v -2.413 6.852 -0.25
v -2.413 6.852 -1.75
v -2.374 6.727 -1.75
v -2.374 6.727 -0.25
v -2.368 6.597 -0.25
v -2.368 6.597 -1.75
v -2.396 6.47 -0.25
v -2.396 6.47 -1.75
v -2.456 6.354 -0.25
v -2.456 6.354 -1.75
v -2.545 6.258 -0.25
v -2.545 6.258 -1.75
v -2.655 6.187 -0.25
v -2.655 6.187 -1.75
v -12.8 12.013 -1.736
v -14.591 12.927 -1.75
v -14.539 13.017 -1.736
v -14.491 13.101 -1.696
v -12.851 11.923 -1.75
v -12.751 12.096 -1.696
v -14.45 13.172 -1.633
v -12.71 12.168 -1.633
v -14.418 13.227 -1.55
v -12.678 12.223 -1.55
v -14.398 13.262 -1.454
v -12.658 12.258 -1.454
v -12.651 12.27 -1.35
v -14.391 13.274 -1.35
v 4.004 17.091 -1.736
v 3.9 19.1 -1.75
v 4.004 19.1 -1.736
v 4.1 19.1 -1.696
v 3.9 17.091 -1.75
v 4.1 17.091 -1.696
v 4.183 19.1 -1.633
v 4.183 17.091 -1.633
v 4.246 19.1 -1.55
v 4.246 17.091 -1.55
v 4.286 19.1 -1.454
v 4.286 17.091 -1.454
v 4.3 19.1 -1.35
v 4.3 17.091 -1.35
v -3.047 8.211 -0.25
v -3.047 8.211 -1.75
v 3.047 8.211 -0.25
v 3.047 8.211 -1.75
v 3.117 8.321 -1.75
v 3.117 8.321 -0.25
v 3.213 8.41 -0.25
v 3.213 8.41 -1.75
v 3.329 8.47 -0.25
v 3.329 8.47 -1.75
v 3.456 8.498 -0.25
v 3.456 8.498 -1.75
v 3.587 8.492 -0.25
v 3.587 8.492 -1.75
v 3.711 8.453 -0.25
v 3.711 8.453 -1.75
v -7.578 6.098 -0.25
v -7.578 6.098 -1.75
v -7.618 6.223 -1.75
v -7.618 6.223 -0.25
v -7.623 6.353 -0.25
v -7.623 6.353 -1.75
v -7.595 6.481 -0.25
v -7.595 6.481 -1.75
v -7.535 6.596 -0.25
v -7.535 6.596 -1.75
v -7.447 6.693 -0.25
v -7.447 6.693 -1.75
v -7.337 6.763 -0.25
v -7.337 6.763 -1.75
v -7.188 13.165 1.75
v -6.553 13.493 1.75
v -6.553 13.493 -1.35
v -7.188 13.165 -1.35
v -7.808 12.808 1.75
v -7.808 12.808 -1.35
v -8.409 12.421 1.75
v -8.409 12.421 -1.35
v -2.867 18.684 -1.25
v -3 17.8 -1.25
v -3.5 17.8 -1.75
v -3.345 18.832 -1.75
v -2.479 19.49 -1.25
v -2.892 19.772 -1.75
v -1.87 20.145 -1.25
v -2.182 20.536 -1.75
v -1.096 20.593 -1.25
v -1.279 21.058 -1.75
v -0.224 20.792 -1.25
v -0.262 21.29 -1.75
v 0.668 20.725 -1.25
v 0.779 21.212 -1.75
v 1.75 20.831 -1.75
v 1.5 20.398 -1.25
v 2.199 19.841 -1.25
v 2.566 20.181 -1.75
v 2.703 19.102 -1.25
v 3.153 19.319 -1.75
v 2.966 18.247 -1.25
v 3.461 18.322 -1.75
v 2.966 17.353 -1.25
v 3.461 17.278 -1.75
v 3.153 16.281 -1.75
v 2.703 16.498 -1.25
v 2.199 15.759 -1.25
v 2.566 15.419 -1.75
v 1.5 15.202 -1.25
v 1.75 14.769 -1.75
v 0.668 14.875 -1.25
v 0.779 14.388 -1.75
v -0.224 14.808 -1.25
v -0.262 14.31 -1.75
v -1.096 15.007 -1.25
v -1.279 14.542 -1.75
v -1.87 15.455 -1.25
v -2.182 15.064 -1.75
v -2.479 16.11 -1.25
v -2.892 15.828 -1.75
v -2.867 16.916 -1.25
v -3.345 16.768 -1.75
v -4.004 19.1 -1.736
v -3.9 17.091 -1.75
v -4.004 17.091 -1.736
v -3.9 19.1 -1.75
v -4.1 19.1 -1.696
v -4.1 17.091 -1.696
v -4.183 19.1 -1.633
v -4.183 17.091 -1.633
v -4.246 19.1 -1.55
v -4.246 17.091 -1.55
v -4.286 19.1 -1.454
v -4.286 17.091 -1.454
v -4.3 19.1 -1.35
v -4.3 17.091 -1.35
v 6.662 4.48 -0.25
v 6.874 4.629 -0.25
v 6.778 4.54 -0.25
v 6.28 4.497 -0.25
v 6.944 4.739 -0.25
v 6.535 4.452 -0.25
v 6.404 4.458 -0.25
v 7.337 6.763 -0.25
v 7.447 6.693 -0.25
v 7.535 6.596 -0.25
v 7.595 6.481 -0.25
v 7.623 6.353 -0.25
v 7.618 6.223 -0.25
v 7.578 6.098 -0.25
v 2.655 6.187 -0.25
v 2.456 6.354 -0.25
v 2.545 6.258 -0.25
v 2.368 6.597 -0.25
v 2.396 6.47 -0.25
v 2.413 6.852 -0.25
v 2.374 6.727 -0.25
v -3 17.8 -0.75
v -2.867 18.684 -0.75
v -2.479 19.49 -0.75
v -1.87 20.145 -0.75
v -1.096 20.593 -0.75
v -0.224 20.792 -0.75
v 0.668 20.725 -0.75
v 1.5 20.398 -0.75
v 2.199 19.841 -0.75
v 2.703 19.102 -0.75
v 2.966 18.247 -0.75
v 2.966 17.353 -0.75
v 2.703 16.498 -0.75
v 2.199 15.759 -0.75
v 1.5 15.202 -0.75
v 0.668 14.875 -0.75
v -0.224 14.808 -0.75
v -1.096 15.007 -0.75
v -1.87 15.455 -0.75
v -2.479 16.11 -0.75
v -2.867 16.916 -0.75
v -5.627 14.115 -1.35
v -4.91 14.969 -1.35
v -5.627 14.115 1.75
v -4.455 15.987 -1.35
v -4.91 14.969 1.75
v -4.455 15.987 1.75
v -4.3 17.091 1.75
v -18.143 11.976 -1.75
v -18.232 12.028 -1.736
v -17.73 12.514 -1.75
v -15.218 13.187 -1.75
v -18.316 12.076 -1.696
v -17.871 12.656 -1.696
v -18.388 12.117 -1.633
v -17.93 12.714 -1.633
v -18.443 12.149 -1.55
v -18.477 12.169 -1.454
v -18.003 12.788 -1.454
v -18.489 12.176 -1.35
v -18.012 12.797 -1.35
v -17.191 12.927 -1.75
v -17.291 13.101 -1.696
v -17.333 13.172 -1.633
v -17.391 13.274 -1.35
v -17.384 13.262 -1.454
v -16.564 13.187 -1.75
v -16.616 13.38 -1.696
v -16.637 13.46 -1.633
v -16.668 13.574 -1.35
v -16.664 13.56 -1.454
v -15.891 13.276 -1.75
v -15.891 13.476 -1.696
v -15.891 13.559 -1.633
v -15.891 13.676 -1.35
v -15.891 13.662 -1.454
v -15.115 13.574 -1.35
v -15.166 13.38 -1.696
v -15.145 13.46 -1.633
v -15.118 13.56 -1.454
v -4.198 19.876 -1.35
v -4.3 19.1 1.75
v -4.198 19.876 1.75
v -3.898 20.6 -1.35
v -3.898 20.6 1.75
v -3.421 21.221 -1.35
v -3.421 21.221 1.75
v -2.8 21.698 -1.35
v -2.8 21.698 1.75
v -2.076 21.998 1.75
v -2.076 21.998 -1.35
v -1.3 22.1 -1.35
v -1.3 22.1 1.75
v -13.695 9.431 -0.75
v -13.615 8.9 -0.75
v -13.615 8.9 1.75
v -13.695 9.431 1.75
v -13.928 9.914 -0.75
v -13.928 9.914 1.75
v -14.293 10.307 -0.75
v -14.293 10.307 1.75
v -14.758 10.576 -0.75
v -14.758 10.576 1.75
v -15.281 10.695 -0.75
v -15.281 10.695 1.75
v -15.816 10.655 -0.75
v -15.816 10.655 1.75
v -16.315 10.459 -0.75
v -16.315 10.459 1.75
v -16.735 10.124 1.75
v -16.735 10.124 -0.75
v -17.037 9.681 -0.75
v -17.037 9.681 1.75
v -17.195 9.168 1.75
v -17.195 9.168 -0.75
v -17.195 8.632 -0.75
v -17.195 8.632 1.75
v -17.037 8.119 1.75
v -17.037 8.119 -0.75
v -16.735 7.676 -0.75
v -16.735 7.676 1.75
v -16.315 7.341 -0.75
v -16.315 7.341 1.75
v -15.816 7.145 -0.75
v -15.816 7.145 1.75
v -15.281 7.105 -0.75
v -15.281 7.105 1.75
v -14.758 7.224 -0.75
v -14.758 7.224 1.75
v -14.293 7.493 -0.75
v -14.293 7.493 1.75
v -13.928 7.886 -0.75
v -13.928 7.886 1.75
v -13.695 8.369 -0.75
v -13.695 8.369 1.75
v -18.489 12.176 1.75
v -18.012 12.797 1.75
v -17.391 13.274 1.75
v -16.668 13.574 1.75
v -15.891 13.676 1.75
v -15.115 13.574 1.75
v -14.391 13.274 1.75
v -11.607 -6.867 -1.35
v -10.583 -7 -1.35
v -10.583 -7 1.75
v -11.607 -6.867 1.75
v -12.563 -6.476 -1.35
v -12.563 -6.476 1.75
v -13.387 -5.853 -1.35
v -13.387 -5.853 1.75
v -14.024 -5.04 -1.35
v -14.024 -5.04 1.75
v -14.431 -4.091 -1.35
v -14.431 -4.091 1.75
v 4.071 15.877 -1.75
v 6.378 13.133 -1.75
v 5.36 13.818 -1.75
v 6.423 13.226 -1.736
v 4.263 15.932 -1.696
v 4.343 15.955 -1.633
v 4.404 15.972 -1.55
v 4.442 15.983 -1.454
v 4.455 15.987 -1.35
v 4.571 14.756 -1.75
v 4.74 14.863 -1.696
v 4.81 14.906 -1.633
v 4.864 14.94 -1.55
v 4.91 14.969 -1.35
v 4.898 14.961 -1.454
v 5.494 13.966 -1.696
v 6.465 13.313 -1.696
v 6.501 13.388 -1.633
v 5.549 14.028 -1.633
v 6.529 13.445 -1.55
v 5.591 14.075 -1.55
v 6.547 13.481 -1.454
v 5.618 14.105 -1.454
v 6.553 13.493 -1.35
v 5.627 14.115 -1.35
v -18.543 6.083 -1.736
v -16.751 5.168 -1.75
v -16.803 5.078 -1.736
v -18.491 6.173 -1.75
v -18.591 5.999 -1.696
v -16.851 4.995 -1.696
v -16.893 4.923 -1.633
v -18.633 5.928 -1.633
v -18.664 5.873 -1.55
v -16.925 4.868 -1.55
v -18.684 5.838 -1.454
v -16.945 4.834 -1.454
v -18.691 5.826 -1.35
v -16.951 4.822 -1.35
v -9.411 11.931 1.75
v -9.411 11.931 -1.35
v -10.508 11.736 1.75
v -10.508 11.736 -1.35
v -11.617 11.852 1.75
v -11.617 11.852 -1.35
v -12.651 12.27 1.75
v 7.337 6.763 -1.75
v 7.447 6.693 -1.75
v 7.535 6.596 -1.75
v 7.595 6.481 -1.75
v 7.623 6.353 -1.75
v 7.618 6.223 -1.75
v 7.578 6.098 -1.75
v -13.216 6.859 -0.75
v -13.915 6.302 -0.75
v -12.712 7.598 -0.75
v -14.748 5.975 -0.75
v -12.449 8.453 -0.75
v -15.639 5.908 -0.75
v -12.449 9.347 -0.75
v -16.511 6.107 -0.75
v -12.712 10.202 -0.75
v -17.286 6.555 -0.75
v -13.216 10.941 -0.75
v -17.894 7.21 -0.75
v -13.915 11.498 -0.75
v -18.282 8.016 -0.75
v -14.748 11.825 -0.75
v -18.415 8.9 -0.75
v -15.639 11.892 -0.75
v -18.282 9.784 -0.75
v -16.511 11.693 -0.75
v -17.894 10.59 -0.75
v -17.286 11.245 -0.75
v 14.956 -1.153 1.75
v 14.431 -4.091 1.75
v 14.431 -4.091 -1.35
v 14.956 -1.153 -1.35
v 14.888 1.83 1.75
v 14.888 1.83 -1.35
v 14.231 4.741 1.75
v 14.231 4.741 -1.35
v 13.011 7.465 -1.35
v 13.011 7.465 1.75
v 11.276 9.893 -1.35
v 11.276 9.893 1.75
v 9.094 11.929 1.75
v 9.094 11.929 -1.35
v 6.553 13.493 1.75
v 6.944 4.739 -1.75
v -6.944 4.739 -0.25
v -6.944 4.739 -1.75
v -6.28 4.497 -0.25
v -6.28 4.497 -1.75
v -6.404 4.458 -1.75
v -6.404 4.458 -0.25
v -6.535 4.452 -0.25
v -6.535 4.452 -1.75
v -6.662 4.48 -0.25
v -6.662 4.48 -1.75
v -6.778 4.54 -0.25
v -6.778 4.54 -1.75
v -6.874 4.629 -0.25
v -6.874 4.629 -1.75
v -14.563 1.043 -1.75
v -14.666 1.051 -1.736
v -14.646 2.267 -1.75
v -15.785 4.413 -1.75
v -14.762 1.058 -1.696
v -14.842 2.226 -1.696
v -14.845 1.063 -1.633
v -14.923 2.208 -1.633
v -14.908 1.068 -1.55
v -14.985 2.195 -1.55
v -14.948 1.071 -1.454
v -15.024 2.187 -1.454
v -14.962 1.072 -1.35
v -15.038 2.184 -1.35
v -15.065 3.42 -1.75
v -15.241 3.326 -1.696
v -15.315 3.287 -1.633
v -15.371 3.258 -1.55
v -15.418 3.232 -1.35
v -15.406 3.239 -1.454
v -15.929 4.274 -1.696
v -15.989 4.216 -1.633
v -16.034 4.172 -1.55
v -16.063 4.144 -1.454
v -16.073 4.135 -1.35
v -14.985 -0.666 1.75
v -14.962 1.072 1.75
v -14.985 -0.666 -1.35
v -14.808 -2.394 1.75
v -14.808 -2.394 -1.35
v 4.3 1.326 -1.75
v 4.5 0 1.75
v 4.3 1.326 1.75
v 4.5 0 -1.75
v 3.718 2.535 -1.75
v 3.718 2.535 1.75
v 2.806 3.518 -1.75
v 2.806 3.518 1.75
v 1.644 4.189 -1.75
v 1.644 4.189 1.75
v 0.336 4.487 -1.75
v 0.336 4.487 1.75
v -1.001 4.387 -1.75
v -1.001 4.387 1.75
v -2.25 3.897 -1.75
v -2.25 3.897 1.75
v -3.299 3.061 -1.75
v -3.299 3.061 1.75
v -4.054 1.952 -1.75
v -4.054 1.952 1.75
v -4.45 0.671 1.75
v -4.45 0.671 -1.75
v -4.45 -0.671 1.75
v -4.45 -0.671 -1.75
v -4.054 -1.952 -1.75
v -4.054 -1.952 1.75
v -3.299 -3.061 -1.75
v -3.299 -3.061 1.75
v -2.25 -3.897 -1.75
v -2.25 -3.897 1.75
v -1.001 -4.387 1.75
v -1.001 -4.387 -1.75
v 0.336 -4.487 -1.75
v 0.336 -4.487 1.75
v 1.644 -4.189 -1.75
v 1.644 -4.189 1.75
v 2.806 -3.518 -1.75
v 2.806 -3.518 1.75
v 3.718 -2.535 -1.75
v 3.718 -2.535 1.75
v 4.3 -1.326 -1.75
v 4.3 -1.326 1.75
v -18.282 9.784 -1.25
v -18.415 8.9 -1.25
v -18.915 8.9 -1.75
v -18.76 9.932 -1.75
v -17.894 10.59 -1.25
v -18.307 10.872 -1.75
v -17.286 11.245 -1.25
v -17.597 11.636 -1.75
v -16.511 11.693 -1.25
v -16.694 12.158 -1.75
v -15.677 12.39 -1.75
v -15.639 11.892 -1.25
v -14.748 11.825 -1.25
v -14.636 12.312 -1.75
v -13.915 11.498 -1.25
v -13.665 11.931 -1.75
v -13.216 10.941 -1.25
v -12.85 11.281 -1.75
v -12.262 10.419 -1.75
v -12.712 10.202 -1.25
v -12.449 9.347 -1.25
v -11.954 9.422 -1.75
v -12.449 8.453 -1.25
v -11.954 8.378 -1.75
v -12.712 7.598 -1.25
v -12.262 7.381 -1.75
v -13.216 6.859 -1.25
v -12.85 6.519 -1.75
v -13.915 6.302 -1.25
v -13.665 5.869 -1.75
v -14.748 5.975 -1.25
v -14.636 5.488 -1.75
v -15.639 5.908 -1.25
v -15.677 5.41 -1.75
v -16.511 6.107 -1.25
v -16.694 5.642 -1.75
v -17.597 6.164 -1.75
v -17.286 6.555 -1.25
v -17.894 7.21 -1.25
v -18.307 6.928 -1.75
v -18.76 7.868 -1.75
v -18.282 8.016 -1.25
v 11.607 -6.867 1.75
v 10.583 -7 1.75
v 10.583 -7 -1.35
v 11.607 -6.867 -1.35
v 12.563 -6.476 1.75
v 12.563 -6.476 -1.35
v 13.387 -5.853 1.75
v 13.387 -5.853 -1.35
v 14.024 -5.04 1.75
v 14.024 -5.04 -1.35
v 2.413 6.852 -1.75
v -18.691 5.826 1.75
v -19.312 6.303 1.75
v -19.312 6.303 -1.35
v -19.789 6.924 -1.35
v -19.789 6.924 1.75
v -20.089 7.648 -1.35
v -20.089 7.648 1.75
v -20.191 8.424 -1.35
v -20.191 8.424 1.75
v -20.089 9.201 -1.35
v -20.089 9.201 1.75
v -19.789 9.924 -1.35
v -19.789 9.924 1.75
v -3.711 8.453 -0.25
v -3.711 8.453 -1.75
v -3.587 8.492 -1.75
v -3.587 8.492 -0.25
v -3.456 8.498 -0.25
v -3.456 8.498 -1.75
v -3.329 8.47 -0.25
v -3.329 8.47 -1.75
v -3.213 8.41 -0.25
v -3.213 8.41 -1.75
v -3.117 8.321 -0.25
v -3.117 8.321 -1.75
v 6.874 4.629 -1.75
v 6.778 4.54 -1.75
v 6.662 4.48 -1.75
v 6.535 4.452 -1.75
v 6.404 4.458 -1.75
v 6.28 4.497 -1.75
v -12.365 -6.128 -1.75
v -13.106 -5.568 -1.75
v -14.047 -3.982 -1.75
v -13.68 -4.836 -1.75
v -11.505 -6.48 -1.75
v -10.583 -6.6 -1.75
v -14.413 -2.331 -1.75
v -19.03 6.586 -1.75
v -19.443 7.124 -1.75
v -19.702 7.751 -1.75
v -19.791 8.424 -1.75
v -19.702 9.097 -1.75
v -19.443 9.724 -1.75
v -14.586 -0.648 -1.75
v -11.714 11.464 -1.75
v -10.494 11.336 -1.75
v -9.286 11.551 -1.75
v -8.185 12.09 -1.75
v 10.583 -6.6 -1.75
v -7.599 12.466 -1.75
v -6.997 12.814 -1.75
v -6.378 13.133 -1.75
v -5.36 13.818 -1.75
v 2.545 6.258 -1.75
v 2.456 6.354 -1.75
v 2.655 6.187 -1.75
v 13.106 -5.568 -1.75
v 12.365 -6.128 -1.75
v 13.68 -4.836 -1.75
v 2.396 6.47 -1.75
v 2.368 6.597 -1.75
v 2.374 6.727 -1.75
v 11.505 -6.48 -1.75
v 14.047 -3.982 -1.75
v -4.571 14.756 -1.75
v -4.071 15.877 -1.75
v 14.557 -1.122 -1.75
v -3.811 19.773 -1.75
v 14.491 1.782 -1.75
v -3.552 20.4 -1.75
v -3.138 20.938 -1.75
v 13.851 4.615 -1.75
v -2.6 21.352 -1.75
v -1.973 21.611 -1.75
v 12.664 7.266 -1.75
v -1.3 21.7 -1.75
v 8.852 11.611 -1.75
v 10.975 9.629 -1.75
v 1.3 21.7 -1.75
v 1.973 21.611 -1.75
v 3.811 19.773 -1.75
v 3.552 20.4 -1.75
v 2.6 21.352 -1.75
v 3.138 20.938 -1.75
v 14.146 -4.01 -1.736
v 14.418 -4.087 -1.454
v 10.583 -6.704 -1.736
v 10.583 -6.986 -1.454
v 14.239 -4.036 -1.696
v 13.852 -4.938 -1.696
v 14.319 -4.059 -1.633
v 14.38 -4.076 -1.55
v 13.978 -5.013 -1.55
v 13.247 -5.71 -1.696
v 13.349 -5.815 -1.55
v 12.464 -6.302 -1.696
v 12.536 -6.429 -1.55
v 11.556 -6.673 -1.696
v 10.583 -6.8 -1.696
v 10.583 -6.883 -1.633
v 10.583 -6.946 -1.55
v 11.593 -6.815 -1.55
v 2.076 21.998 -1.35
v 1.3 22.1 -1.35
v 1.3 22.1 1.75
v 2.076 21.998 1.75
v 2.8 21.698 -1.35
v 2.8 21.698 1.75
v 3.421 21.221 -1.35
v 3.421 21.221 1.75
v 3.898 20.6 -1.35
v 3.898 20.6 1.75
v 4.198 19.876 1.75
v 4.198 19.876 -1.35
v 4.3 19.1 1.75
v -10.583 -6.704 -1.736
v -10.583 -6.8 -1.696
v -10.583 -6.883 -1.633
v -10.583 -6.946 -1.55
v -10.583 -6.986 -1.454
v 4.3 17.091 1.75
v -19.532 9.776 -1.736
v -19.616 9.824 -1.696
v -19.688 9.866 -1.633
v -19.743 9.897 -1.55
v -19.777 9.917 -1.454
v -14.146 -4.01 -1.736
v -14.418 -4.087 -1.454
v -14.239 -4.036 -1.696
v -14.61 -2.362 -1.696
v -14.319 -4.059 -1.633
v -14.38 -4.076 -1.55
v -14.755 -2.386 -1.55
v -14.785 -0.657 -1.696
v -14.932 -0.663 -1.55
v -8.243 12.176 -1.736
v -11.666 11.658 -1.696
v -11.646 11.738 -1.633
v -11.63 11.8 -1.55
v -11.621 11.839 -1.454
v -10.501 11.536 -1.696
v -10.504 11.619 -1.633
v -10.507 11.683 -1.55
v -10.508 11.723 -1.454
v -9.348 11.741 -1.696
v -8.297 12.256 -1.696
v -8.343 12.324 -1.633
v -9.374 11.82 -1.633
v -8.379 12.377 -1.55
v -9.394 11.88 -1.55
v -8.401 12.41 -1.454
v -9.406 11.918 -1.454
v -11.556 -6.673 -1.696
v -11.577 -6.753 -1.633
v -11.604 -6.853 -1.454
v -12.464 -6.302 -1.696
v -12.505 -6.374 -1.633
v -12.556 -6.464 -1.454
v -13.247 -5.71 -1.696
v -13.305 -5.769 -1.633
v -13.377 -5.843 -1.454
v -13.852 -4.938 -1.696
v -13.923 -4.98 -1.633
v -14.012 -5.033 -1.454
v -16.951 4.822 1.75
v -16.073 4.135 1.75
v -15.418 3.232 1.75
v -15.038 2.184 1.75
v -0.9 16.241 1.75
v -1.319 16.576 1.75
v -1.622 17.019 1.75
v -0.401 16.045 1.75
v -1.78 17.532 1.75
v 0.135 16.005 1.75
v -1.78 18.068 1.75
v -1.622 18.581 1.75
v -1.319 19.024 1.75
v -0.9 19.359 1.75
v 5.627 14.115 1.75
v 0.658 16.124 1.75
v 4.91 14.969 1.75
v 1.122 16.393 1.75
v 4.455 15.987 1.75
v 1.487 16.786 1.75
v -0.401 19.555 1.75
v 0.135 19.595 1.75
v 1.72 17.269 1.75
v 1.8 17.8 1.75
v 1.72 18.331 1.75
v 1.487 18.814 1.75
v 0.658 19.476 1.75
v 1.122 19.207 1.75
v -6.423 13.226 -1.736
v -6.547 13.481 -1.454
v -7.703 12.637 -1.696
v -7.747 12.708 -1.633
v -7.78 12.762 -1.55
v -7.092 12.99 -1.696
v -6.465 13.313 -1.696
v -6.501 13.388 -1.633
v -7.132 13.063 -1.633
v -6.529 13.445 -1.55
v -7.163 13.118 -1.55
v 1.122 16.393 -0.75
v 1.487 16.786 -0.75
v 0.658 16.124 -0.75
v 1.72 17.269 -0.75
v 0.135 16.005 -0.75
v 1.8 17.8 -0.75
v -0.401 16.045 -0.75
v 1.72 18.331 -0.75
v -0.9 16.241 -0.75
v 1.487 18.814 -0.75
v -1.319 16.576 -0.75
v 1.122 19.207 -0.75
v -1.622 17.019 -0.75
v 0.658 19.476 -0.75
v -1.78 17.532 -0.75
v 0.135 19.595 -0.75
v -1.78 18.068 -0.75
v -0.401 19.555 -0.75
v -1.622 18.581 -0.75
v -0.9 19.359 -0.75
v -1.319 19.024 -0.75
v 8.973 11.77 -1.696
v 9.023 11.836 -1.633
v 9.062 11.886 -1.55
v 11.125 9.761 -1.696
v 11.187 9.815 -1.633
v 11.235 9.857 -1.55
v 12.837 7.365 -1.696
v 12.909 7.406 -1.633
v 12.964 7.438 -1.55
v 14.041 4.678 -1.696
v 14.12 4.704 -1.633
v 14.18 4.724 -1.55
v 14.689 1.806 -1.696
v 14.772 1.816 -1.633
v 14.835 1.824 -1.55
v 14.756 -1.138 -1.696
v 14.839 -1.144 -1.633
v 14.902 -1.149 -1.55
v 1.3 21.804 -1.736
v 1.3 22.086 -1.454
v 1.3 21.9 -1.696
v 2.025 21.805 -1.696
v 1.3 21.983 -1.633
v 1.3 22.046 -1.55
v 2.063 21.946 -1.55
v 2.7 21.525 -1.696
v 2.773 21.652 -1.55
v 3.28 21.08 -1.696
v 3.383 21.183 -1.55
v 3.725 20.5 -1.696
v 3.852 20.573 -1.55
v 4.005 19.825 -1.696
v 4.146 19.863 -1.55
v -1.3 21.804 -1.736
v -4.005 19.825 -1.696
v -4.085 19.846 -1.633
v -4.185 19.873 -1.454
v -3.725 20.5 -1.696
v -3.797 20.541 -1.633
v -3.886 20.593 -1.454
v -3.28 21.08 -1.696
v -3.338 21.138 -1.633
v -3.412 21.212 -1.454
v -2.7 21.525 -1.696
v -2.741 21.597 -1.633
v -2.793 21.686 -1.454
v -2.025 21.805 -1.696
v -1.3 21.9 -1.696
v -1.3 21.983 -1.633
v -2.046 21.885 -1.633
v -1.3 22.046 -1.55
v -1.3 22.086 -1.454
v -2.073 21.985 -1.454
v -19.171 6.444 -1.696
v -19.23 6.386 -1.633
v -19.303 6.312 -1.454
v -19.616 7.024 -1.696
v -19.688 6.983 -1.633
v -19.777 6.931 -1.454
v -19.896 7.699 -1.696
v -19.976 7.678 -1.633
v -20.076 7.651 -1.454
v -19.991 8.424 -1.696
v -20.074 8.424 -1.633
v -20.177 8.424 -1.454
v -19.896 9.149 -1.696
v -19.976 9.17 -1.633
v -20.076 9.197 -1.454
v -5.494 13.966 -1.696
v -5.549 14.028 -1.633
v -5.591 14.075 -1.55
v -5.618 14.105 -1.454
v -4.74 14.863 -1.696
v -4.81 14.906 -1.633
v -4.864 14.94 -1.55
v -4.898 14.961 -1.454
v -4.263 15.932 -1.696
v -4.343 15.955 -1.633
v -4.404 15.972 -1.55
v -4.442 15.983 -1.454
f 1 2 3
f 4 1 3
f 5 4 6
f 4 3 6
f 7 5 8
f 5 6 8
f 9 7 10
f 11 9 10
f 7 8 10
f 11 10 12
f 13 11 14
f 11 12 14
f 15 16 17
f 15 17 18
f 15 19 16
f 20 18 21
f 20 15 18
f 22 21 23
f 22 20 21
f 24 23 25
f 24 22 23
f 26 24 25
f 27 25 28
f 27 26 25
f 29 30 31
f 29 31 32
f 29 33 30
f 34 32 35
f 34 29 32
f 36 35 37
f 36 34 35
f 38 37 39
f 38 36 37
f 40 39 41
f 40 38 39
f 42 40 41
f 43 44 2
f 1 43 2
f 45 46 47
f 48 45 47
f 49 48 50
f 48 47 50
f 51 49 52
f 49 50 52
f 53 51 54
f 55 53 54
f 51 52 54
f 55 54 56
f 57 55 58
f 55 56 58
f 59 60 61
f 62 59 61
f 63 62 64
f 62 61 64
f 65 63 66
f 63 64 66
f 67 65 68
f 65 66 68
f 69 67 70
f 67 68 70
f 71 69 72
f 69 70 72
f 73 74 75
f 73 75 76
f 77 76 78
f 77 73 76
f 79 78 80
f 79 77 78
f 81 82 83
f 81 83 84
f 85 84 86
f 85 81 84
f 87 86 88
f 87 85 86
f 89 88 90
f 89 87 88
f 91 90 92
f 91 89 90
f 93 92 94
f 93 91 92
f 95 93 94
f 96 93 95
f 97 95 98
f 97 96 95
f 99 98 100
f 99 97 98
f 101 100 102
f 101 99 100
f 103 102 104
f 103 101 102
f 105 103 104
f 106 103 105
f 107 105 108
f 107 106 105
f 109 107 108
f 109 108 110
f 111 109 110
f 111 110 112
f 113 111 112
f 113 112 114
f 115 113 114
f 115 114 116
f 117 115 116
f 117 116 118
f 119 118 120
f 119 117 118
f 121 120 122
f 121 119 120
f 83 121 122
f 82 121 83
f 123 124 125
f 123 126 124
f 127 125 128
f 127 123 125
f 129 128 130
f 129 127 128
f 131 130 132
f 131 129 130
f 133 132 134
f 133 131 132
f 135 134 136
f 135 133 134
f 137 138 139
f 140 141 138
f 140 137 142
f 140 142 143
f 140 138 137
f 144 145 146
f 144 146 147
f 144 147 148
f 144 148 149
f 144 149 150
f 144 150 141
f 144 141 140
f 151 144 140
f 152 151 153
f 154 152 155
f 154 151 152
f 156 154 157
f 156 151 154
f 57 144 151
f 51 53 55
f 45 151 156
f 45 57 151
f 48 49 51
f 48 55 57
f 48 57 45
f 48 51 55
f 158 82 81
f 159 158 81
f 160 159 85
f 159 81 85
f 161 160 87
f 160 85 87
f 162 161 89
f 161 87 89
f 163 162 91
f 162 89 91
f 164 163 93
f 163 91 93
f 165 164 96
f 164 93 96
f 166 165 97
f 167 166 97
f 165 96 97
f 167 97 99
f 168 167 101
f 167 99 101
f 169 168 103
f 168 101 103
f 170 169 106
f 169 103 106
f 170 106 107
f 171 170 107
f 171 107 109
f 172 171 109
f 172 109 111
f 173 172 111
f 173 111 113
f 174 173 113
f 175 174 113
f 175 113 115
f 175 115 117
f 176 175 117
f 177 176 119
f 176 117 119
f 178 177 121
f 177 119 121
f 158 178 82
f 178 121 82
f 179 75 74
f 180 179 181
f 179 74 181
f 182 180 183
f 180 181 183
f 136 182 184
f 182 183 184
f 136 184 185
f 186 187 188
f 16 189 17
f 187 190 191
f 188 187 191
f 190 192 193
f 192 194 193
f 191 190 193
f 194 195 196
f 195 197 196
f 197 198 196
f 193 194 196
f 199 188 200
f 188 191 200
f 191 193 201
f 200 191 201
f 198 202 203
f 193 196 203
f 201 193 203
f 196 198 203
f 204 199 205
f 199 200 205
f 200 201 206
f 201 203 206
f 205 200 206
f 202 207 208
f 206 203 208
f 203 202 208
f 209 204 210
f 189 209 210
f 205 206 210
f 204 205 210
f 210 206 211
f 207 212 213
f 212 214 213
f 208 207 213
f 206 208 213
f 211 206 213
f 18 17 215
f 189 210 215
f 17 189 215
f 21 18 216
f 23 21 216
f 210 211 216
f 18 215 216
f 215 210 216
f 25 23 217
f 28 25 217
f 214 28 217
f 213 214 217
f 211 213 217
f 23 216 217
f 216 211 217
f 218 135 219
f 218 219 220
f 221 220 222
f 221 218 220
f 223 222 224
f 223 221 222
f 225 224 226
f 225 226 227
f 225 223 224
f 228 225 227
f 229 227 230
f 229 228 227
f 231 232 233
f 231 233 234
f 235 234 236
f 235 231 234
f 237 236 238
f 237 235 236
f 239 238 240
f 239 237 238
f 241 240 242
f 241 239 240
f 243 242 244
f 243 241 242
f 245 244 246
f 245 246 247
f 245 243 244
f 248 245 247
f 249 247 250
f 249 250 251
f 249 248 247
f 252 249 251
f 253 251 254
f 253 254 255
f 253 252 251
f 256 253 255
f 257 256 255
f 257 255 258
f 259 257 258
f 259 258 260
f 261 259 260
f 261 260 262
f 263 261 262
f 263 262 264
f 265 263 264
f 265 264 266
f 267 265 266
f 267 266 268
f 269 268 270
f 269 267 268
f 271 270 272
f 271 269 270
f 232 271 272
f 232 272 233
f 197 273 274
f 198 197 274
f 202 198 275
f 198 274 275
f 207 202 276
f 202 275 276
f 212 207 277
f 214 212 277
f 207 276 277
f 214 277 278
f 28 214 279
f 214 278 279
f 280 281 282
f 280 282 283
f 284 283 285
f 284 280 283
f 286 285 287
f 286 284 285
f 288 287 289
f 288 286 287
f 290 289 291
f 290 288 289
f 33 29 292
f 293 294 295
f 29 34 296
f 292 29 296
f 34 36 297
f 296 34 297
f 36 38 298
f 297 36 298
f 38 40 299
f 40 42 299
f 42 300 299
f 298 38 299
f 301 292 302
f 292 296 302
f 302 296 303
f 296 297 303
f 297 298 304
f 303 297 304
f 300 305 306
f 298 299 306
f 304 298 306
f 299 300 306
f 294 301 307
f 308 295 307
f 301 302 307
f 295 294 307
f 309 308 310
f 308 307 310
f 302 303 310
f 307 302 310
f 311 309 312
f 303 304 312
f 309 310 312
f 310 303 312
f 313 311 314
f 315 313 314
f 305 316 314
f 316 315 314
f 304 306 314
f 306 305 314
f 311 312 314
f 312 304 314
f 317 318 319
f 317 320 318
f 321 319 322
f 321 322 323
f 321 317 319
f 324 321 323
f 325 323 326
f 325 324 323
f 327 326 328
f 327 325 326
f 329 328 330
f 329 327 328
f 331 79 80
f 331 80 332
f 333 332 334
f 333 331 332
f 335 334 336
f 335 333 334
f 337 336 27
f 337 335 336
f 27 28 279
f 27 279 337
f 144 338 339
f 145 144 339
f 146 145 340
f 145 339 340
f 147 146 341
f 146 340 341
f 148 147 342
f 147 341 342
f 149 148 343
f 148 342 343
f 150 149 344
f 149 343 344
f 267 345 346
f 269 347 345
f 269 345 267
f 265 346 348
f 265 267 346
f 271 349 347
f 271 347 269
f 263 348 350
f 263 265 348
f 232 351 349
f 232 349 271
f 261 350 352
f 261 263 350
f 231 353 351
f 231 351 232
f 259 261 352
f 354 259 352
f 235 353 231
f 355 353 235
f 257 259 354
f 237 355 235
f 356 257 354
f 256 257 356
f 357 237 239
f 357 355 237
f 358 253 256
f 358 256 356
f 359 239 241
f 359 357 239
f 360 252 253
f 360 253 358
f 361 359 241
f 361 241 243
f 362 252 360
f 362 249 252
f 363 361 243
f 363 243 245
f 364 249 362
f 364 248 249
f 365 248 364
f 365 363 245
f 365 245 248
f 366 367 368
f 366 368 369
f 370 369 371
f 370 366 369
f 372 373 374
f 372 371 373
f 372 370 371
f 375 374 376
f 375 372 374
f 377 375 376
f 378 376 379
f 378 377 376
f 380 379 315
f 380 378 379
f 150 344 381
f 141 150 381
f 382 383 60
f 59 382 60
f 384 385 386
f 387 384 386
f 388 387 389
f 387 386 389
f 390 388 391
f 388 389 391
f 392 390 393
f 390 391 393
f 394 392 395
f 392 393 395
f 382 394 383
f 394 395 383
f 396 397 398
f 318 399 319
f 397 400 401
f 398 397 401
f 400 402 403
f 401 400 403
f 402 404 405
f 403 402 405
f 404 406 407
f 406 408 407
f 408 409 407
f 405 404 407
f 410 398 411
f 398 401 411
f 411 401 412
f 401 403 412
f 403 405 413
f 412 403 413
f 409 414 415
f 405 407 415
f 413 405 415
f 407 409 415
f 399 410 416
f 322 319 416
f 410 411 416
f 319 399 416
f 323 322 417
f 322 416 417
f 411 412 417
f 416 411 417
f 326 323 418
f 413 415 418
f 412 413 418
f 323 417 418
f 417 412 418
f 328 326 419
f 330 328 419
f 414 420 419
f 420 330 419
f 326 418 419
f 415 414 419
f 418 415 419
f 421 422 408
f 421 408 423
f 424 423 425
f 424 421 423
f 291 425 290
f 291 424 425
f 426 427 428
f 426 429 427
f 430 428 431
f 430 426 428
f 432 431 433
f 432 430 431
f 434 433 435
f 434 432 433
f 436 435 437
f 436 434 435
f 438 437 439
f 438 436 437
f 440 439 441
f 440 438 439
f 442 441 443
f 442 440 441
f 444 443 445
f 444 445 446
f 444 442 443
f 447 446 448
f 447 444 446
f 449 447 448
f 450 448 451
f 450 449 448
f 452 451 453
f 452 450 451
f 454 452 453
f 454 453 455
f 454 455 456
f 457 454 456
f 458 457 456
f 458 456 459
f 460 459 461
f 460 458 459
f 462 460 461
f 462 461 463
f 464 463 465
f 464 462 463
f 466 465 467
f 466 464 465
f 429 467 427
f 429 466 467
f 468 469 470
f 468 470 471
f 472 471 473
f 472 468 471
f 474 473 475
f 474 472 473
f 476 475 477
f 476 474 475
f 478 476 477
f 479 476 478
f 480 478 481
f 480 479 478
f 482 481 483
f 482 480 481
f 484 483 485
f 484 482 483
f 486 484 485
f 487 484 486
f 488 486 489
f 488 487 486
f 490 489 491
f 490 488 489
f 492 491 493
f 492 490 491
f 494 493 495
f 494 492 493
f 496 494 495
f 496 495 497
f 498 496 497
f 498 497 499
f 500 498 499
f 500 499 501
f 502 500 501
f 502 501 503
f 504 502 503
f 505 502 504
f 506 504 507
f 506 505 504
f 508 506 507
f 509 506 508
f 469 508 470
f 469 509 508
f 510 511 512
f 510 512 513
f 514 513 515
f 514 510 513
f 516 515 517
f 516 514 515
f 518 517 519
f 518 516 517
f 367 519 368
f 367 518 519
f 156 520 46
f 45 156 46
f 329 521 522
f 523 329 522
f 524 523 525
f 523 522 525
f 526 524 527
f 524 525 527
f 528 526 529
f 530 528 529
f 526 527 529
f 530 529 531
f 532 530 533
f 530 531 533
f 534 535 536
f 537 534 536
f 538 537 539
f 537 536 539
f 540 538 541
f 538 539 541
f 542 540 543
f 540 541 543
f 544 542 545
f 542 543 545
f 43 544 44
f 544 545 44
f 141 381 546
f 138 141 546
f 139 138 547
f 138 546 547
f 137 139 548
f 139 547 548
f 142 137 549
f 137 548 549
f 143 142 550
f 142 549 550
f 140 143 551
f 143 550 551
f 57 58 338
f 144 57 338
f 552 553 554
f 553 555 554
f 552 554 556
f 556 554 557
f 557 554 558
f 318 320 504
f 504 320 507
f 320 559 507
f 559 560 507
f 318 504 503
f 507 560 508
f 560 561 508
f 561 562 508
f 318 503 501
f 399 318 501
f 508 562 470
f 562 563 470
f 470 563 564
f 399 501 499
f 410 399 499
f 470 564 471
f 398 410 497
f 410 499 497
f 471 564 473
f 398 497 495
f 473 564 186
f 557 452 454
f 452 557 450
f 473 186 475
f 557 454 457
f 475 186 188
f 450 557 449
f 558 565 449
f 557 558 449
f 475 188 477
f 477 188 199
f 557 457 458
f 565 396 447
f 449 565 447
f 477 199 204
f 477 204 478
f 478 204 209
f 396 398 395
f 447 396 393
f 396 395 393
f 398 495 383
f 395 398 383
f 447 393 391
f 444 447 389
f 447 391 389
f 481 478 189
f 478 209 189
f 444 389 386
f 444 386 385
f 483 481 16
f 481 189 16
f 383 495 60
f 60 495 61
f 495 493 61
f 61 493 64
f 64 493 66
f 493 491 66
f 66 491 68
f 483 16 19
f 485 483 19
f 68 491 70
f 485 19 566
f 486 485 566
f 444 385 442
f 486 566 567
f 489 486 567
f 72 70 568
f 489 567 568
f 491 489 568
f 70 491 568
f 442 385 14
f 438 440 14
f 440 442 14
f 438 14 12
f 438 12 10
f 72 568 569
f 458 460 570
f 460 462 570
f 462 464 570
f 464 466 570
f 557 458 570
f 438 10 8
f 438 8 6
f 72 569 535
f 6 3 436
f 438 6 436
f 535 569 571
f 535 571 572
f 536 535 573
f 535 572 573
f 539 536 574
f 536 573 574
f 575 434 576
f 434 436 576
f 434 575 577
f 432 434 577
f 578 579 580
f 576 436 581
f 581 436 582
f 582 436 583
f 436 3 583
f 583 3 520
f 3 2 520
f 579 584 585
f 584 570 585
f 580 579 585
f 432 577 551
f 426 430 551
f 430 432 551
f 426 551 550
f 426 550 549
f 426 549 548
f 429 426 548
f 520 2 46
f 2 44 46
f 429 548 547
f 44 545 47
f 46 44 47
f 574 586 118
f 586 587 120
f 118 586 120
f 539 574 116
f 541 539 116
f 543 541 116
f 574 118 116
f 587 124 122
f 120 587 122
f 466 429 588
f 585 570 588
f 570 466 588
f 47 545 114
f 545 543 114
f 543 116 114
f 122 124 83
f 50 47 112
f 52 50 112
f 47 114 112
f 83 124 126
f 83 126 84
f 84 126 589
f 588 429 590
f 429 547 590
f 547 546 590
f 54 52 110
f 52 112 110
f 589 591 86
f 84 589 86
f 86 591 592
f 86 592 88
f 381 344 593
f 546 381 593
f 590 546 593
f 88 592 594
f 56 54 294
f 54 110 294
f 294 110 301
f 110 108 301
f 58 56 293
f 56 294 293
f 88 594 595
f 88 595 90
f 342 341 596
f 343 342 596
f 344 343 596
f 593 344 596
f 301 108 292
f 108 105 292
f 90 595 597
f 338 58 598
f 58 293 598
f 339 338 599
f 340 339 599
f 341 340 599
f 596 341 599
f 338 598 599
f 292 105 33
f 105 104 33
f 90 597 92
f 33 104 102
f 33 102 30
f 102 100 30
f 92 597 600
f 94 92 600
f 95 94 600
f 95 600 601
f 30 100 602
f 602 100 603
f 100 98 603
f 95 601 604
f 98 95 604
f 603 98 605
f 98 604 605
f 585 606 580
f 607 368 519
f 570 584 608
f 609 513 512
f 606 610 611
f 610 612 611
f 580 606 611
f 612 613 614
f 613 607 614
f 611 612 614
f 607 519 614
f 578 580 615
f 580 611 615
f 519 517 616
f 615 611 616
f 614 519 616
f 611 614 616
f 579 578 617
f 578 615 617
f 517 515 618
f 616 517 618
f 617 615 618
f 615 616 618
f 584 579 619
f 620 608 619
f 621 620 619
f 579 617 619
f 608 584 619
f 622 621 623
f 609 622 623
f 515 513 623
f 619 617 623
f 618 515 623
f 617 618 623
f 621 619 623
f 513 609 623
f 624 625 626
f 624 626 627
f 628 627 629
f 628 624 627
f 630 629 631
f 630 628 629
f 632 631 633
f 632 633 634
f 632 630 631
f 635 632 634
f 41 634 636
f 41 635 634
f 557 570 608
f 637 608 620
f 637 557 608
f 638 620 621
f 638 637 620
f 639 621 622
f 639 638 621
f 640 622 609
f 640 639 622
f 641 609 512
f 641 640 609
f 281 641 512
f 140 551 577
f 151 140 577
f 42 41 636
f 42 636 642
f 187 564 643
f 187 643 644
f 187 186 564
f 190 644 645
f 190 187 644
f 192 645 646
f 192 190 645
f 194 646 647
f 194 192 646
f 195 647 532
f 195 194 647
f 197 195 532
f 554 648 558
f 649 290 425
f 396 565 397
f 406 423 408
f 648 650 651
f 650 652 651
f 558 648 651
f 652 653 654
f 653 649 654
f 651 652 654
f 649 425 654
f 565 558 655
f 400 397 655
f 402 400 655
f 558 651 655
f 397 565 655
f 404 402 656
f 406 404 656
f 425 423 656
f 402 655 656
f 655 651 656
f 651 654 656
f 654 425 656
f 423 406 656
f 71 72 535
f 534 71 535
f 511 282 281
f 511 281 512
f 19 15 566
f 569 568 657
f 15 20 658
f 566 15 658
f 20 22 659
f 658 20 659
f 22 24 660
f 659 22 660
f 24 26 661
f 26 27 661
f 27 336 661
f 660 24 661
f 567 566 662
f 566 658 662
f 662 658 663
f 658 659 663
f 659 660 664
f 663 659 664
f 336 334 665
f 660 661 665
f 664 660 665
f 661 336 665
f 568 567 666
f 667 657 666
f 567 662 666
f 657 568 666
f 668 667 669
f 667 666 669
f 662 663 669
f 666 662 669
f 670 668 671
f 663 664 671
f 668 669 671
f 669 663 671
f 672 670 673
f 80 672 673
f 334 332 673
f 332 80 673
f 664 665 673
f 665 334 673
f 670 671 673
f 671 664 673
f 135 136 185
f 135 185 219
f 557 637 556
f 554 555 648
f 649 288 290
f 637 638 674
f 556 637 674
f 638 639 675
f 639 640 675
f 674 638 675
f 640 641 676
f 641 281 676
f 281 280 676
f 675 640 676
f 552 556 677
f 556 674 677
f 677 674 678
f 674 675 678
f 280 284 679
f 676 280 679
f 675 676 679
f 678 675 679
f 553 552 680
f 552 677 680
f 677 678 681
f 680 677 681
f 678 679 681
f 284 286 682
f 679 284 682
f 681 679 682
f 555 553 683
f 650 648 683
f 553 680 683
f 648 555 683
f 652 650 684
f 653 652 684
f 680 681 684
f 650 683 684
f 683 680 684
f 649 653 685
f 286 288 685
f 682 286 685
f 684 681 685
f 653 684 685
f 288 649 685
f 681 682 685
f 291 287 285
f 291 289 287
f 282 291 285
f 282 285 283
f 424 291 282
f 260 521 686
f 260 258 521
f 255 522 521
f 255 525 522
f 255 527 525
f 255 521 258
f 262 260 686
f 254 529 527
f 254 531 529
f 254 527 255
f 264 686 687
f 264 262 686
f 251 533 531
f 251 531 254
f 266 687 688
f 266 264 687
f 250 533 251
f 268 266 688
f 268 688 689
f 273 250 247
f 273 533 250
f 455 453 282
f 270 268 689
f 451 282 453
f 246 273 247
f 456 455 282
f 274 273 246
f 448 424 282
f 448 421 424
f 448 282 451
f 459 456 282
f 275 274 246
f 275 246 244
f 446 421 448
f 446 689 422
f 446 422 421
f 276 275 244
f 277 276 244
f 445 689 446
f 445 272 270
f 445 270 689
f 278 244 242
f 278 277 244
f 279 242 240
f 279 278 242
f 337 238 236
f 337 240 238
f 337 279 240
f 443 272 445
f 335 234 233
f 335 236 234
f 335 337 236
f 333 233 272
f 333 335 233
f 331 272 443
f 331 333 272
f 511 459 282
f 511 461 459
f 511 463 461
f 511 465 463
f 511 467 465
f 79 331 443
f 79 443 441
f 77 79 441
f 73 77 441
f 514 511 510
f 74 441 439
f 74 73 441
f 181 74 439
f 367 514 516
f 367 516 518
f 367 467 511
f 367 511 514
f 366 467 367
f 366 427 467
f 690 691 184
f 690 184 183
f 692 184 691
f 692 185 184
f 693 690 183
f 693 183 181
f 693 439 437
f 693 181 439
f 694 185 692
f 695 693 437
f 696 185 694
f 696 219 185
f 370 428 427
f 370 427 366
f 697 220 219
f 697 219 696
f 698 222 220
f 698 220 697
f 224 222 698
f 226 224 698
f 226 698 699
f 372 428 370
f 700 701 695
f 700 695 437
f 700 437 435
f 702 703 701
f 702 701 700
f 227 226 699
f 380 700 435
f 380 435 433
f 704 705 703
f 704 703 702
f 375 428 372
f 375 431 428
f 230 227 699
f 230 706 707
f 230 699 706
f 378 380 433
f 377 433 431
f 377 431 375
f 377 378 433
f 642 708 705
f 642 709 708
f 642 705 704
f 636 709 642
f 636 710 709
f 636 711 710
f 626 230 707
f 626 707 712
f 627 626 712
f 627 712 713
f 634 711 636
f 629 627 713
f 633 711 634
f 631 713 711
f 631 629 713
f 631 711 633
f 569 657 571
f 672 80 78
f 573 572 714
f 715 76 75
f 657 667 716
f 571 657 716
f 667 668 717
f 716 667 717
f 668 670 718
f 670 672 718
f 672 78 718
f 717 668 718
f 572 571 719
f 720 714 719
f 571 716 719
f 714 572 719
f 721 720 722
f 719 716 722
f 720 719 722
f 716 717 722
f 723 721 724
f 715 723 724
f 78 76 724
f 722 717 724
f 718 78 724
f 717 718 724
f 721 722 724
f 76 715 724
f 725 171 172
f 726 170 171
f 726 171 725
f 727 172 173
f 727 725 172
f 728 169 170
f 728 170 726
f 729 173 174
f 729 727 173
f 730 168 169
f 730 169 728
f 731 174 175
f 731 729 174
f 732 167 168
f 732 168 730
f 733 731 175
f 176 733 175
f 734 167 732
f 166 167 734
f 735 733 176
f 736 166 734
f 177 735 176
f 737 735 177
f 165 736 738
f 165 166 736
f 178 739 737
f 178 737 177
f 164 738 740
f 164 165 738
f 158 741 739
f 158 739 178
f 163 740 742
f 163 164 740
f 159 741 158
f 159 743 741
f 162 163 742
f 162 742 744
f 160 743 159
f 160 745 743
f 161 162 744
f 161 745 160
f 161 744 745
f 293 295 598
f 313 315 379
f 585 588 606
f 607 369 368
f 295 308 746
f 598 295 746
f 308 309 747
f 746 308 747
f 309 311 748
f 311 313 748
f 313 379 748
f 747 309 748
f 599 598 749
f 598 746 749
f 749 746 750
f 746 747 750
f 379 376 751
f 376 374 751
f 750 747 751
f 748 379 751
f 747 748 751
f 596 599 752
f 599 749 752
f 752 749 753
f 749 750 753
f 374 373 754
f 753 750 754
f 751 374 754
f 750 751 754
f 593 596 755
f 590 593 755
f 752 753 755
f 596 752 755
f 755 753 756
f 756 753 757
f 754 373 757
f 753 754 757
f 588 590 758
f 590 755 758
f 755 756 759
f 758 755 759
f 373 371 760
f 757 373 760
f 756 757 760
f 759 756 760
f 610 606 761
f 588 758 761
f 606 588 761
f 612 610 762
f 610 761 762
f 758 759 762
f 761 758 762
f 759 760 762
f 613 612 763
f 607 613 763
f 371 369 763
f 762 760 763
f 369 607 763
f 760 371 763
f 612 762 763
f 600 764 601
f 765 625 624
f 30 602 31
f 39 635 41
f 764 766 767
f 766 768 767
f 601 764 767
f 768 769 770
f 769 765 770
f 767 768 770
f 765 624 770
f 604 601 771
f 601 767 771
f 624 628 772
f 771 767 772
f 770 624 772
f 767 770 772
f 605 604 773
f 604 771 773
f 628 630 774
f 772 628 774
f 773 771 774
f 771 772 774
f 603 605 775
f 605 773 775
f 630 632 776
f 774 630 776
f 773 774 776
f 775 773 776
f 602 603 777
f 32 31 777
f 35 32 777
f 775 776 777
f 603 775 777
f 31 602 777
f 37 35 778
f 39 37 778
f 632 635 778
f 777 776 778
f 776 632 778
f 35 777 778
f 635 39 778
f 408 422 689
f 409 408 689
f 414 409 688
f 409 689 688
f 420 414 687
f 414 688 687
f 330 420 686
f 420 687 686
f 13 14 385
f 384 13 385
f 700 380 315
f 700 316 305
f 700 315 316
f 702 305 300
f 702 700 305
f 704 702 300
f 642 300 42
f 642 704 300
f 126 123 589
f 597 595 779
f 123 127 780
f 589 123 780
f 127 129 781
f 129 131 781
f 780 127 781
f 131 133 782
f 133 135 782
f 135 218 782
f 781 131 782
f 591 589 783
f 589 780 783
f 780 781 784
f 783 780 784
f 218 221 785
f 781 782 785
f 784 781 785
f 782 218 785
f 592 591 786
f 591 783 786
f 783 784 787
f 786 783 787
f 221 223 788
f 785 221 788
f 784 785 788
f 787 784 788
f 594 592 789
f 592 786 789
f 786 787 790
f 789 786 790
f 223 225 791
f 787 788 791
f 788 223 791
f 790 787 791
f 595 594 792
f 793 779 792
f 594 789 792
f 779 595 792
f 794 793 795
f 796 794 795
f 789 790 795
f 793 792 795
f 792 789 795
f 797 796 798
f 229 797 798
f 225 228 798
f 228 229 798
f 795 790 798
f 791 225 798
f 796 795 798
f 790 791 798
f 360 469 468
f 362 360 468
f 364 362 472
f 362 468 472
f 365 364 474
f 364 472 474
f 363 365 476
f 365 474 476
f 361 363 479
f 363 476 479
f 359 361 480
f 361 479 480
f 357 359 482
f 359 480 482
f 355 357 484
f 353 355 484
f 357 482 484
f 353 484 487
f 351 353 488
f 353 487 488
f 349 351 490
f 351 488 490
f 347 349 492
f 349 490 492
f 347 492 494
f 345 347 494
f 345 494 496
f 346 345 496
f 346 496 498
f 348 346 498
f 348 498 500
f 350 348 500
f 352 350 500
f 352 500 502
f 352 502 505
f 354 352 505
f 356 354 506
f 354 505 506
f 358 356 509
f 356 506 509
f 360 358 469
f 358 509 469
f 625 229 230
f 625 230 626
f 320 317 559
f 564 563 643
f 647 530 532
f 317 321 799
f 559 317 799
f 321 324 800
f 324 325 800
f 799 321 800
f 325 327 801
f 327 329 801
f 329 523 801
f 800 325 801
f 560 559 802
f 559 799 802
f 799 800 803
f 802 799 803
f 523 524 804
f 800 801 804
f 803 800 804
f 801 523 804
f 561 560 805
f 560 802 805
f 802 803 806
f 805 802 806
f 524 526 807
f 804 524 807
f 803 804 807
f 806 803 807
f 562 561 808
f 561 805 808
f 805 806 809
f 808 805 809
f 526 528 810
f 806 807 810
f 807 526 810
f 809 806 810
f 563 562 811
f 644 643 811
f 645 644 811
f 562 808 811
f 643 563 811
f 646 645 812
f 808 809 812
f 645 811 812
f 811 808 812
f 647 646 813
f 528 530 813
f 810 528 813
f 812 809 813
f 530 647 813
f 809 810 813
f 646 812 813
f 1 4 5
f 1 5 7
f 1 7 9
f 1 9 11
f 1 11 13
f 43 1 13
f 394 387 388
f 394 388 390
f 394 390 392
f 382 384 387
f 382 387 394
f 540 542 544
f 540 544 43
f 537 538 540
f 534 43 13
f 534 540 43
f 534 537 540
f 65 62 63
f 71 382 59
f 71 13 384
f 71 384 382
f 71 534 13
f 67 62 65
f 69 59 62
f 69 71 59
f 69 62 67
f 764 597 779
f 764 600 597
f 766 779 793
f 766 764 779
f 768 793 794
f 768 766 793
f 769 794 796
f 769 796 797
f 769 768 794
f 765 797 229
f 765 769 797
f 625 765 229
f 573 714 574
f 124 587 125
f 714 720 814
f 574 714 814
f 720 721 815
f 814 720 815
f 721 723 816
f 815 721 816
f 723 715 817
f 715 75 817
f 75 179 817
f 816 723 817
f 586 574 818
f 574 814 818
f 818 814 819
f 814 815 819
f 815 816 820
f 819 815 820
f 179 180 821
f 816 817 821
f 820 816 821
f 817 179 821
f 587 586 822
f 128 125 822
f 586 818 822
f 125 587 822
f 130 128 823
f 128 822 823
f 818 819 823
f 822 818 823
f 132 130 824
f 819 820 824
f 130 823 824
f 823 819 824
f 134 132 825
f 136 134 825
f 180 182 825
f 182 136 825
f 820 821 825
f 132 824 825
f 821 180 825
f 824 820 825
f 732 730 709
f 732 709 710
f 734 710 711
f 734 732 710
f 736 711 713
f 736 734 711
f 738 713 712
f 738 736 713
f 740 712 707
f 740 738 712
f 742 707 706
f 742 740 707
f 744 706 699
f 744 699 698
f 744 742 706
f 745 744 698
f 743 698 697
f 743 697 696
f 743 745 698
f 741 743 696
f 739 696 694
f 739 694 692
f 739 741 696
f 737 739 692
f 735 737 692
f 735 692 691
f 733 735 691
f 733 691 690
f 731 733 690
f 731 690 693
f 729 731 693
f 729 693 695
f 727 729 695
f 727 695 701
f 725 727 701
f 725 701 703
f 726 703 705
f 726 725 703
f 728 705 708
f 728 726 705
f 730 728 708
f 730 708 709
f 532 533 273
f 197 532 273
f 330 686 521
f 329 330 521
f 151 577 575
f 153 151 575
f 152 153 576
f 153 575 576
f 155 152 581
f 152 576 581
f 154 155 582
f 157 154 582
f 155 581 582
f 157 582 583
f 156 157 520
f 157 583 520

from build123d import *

# Parameters (mm, degrees)
SKETCH10_R          = 4.5
BOSS_EXTRUDE6_DEPTH = 1.75
SKETCH13_R          = 1.8
BOSS_EXTRUDE7_DEPTH = 1.75
FILLET1_R           = 4
CUT_EXTRUDE2_DEPTH  = 1.5
SKETCH16_R          = 3
CUT_EXTRUDE3_DEPTH  = 1
CHAMFER1_SIZE       = 0.5
FILLET2_R           = 0.4


with BuildPart() as part:
    # Sketch10 → Boss-Extrude6 (new, symmetric)
    with BuildSketch(Plane.XY):
        with BuildLine():
            Line((-13.266499161, -7), (13.266499161, -7))
            ThreePointArc((13.266499161, -7), (0, 15), (-13.266499161, -7))
        make_face()
        Circle(SKETCH10_R, mode=Mode.SUBTRACT)
    extrude(amount=BOSS_EXTRUDE6_DEPTH, both=True)

    # Sketch13 → Boss-Extrude7 (add, symmetric)
    # profile 1 of 2: a face of its own
    with BuildSketch(Plane.XY):
        with BuildLine():
            Line((-4.3, 14.370455803), (-4.3, 19.1))
            ThreePointArc((-4.3, 19.1), (-3.421320344, 21.221320344), (-1.3, 22.1))
            Line((-1.3, 22.1), (1.3, 22.1))
            ThreePointArc((1.3, 22.1), (3.421320344, 21.221320344), (4.3, 19.1))
            Line((4.3, 19.1), (4.3, 14.370455803))
            ThreePointArc((4.3, 14.370455803), (0, 15), (-4.3, 14.370455803))
        make_face()
        with Locations((0, 17.8)):
            Circle(SKETCH13_R, mode=Mode.SUBTRACT)
    # profile 2 of 2: a face of its own
    with BuildSketch(Plane.XY):
        with BuildLine():
            Line((-14.59517979, 3.461318665), (-18.691085212, 5.826090764))
            ThreePointArc((-18.691085212, 5.826090764), (-20.088862691, 7.64770984), (-19.789161424, 9.924166975))
            Line((-19.789161424, 9.924166975), (-18.489161424, 12.175833025))
            ThreePointArc((-18.489161424, 12.175833025), (-16.667542348, 13.573610504), (-14.391085212, 13.273909236))
            Line((-14.391085212, 13.273909236), (-10.29517979, 10.909137138))
            ThreePointArc((-10.29517979, 10.909137138), (-12.990381057, 7.5), (-14.59517979, 3.461318665))
        make_face()
        with Locations((-15.415252187, 8.9)):
            Circle(SKETCH13_R, mode=Mode.SUBTRACT)
    extrude(amount=BOSS_EXTRUDE7_DEPTH, both=True)

    # Fillet1
    fillet1_edges = [part.edges().sort_by_distance(p)[0] for p in [
        (-4.3, 14.370455803, 0),
        (4.3, 14.370455803, 0),
        (-14.59517979, 3.461318665, 0),
        (-10.29517979, 10.909137138, 0),
        (13.266499161, -7, 0),
        (-13.266499161, -7, 0),
    ]]
    fillet(fillet1_edges, radius=FILLET1_R)

    # Sketch15 → Cut-Extrude2 (cut)
    with BuildSketch(Plane(origin=(0, 0, -1.75), x_dir=(-1, 0, 0), z_dir=(0, 0, -1))):
        with BuildLine():
            Line((-3.711309131, 8.453153894), (-7.336540279, 6.762680847))
            ThreePointArc((-7.336540279, 6.762680847), (-7.595077459, 6.480537025), (-7.578385042, 6.098217822))
            Line((-7.578385042, 6.098217822), (-6.944457649, 4.738756142))
            ThreePointArc((-6.944457649, 4.738756142), (-6.662313827, 4.480218962), (-6.279994625, 4.496911379))
            Line((-6.279994625, 4.496911379), (-2.654763477, 6.187384426))
            ThreePointArc((-2.654763477, 6.187384426), (-2.396226297, 6.469528248), (-2.412918714, 6.85184745))
            Line((-2.412918714, 6.85184745), (-3.046846106, 8.211309131))
            ThreePointArc((-3.046846106, 8.211309131), (-3.328989928, 8.46984631), (-3.711309131, 8.453153894))
        make_face()
        with BuildLine():
            Line((6.944457649, 4.738756142), (7.578385042, 6.098217822))
            ThreePointArc((7.578385042, 6.098217822), (7.595077459, 6.480537025), (7.336540279, 6.762680847))
            Line((7.336540279, 6.762680847), (3.711309131, 8.453153894))
            ThreePointArc((3.711309131, 8.453153894), (3.328989928, 8.46984631), (3.046846106, 8.211309131))
            Line((3.046846106, 8.211309131), (2.412918714, 6.85184745))
            ThreePointArc((2.412918714, 6.85184745), (2.396226297, 6.469528248), (2.654763477, 6.187384426))
            Line((2.654763477, 6.187384426), (6.279994625, 4.496911379))
            ThreePointArc((6.279994625, 4.496911379), (6.662313827, 4.480218962), (6.944457649, 4.738756142))
        make_face()
    extrude(amount=-CUT_EXTRUDE2_DEPTH, mode=Mode.SUBTRACT)

    # Sketch16 → Cut-Extrude3 (cut)
    with BuildSketch(Plane(origin=(0, 0, -1.75), x_dir=(-1, 0, 0), z_dir=(0, 0, -1))):
        with Locations((0, 17.8)):
            Circle(SKETCH16_R)
        with Locations((15.415252187, 8.9)):
            Circle(SKETCH16_R)
    extrude(amount=-CUT_EXTRUDE3_DEPTH, mode=Mode.SUBTRACT)

    # Chamfer1
    chamfer1_edges = [part.edges().sort_by_distance(p)[0] for p in [
        (3, 17.8, -1.75),
        (-12.415252187, 8.9, -1.75),
    ]]
    chamfer(chamfer1_edges, length=CHAMFER1_SIZE)

    # Fillet2
    fillet2_edges = [part.edges().sort_by_distance(p)[0] for p in [
        (3.421320344, 21.221320344, -1.75),
        (0, 22.1, -1.75),
        (-3.421320344, 21.221320344, -1.75),
        (-4.3, 18.09561291, -1.75),
        (-16.667542348, 13.573610504, -1.75),
        (-19.139161424, 11.05, -1.75),
        (-20.088862691, 7.64770984, -1.75),
        (-17.821260477, 5.323897219, -1.75),
        (-14.921492219, -1.5326676, -1.75),
        (4.3, 18.09561291, -1.75),
        (13.688725123, 6.133417032, -1.75),
        (-13.521260477, 12.771715691, -1.75),
        (-7.5, 12.990381057, -1.75),
        (0, -7, -1.75),
        (-12.995096001, -6.190896141, -1.75),
        (12.995096001, -6.190896141, -1.75),
        (-15.418049964, 3.232484708, -1.75),
        (4.909611108, 14.9686653, -1.75),
        (-10.508438857, 11.736180592, -1.75),
        (-4.909611108, 14.9686653, -1.75),
    ]]
    fillet(fillet2_edges, radius=FILLET2_R)


solid = part.part
